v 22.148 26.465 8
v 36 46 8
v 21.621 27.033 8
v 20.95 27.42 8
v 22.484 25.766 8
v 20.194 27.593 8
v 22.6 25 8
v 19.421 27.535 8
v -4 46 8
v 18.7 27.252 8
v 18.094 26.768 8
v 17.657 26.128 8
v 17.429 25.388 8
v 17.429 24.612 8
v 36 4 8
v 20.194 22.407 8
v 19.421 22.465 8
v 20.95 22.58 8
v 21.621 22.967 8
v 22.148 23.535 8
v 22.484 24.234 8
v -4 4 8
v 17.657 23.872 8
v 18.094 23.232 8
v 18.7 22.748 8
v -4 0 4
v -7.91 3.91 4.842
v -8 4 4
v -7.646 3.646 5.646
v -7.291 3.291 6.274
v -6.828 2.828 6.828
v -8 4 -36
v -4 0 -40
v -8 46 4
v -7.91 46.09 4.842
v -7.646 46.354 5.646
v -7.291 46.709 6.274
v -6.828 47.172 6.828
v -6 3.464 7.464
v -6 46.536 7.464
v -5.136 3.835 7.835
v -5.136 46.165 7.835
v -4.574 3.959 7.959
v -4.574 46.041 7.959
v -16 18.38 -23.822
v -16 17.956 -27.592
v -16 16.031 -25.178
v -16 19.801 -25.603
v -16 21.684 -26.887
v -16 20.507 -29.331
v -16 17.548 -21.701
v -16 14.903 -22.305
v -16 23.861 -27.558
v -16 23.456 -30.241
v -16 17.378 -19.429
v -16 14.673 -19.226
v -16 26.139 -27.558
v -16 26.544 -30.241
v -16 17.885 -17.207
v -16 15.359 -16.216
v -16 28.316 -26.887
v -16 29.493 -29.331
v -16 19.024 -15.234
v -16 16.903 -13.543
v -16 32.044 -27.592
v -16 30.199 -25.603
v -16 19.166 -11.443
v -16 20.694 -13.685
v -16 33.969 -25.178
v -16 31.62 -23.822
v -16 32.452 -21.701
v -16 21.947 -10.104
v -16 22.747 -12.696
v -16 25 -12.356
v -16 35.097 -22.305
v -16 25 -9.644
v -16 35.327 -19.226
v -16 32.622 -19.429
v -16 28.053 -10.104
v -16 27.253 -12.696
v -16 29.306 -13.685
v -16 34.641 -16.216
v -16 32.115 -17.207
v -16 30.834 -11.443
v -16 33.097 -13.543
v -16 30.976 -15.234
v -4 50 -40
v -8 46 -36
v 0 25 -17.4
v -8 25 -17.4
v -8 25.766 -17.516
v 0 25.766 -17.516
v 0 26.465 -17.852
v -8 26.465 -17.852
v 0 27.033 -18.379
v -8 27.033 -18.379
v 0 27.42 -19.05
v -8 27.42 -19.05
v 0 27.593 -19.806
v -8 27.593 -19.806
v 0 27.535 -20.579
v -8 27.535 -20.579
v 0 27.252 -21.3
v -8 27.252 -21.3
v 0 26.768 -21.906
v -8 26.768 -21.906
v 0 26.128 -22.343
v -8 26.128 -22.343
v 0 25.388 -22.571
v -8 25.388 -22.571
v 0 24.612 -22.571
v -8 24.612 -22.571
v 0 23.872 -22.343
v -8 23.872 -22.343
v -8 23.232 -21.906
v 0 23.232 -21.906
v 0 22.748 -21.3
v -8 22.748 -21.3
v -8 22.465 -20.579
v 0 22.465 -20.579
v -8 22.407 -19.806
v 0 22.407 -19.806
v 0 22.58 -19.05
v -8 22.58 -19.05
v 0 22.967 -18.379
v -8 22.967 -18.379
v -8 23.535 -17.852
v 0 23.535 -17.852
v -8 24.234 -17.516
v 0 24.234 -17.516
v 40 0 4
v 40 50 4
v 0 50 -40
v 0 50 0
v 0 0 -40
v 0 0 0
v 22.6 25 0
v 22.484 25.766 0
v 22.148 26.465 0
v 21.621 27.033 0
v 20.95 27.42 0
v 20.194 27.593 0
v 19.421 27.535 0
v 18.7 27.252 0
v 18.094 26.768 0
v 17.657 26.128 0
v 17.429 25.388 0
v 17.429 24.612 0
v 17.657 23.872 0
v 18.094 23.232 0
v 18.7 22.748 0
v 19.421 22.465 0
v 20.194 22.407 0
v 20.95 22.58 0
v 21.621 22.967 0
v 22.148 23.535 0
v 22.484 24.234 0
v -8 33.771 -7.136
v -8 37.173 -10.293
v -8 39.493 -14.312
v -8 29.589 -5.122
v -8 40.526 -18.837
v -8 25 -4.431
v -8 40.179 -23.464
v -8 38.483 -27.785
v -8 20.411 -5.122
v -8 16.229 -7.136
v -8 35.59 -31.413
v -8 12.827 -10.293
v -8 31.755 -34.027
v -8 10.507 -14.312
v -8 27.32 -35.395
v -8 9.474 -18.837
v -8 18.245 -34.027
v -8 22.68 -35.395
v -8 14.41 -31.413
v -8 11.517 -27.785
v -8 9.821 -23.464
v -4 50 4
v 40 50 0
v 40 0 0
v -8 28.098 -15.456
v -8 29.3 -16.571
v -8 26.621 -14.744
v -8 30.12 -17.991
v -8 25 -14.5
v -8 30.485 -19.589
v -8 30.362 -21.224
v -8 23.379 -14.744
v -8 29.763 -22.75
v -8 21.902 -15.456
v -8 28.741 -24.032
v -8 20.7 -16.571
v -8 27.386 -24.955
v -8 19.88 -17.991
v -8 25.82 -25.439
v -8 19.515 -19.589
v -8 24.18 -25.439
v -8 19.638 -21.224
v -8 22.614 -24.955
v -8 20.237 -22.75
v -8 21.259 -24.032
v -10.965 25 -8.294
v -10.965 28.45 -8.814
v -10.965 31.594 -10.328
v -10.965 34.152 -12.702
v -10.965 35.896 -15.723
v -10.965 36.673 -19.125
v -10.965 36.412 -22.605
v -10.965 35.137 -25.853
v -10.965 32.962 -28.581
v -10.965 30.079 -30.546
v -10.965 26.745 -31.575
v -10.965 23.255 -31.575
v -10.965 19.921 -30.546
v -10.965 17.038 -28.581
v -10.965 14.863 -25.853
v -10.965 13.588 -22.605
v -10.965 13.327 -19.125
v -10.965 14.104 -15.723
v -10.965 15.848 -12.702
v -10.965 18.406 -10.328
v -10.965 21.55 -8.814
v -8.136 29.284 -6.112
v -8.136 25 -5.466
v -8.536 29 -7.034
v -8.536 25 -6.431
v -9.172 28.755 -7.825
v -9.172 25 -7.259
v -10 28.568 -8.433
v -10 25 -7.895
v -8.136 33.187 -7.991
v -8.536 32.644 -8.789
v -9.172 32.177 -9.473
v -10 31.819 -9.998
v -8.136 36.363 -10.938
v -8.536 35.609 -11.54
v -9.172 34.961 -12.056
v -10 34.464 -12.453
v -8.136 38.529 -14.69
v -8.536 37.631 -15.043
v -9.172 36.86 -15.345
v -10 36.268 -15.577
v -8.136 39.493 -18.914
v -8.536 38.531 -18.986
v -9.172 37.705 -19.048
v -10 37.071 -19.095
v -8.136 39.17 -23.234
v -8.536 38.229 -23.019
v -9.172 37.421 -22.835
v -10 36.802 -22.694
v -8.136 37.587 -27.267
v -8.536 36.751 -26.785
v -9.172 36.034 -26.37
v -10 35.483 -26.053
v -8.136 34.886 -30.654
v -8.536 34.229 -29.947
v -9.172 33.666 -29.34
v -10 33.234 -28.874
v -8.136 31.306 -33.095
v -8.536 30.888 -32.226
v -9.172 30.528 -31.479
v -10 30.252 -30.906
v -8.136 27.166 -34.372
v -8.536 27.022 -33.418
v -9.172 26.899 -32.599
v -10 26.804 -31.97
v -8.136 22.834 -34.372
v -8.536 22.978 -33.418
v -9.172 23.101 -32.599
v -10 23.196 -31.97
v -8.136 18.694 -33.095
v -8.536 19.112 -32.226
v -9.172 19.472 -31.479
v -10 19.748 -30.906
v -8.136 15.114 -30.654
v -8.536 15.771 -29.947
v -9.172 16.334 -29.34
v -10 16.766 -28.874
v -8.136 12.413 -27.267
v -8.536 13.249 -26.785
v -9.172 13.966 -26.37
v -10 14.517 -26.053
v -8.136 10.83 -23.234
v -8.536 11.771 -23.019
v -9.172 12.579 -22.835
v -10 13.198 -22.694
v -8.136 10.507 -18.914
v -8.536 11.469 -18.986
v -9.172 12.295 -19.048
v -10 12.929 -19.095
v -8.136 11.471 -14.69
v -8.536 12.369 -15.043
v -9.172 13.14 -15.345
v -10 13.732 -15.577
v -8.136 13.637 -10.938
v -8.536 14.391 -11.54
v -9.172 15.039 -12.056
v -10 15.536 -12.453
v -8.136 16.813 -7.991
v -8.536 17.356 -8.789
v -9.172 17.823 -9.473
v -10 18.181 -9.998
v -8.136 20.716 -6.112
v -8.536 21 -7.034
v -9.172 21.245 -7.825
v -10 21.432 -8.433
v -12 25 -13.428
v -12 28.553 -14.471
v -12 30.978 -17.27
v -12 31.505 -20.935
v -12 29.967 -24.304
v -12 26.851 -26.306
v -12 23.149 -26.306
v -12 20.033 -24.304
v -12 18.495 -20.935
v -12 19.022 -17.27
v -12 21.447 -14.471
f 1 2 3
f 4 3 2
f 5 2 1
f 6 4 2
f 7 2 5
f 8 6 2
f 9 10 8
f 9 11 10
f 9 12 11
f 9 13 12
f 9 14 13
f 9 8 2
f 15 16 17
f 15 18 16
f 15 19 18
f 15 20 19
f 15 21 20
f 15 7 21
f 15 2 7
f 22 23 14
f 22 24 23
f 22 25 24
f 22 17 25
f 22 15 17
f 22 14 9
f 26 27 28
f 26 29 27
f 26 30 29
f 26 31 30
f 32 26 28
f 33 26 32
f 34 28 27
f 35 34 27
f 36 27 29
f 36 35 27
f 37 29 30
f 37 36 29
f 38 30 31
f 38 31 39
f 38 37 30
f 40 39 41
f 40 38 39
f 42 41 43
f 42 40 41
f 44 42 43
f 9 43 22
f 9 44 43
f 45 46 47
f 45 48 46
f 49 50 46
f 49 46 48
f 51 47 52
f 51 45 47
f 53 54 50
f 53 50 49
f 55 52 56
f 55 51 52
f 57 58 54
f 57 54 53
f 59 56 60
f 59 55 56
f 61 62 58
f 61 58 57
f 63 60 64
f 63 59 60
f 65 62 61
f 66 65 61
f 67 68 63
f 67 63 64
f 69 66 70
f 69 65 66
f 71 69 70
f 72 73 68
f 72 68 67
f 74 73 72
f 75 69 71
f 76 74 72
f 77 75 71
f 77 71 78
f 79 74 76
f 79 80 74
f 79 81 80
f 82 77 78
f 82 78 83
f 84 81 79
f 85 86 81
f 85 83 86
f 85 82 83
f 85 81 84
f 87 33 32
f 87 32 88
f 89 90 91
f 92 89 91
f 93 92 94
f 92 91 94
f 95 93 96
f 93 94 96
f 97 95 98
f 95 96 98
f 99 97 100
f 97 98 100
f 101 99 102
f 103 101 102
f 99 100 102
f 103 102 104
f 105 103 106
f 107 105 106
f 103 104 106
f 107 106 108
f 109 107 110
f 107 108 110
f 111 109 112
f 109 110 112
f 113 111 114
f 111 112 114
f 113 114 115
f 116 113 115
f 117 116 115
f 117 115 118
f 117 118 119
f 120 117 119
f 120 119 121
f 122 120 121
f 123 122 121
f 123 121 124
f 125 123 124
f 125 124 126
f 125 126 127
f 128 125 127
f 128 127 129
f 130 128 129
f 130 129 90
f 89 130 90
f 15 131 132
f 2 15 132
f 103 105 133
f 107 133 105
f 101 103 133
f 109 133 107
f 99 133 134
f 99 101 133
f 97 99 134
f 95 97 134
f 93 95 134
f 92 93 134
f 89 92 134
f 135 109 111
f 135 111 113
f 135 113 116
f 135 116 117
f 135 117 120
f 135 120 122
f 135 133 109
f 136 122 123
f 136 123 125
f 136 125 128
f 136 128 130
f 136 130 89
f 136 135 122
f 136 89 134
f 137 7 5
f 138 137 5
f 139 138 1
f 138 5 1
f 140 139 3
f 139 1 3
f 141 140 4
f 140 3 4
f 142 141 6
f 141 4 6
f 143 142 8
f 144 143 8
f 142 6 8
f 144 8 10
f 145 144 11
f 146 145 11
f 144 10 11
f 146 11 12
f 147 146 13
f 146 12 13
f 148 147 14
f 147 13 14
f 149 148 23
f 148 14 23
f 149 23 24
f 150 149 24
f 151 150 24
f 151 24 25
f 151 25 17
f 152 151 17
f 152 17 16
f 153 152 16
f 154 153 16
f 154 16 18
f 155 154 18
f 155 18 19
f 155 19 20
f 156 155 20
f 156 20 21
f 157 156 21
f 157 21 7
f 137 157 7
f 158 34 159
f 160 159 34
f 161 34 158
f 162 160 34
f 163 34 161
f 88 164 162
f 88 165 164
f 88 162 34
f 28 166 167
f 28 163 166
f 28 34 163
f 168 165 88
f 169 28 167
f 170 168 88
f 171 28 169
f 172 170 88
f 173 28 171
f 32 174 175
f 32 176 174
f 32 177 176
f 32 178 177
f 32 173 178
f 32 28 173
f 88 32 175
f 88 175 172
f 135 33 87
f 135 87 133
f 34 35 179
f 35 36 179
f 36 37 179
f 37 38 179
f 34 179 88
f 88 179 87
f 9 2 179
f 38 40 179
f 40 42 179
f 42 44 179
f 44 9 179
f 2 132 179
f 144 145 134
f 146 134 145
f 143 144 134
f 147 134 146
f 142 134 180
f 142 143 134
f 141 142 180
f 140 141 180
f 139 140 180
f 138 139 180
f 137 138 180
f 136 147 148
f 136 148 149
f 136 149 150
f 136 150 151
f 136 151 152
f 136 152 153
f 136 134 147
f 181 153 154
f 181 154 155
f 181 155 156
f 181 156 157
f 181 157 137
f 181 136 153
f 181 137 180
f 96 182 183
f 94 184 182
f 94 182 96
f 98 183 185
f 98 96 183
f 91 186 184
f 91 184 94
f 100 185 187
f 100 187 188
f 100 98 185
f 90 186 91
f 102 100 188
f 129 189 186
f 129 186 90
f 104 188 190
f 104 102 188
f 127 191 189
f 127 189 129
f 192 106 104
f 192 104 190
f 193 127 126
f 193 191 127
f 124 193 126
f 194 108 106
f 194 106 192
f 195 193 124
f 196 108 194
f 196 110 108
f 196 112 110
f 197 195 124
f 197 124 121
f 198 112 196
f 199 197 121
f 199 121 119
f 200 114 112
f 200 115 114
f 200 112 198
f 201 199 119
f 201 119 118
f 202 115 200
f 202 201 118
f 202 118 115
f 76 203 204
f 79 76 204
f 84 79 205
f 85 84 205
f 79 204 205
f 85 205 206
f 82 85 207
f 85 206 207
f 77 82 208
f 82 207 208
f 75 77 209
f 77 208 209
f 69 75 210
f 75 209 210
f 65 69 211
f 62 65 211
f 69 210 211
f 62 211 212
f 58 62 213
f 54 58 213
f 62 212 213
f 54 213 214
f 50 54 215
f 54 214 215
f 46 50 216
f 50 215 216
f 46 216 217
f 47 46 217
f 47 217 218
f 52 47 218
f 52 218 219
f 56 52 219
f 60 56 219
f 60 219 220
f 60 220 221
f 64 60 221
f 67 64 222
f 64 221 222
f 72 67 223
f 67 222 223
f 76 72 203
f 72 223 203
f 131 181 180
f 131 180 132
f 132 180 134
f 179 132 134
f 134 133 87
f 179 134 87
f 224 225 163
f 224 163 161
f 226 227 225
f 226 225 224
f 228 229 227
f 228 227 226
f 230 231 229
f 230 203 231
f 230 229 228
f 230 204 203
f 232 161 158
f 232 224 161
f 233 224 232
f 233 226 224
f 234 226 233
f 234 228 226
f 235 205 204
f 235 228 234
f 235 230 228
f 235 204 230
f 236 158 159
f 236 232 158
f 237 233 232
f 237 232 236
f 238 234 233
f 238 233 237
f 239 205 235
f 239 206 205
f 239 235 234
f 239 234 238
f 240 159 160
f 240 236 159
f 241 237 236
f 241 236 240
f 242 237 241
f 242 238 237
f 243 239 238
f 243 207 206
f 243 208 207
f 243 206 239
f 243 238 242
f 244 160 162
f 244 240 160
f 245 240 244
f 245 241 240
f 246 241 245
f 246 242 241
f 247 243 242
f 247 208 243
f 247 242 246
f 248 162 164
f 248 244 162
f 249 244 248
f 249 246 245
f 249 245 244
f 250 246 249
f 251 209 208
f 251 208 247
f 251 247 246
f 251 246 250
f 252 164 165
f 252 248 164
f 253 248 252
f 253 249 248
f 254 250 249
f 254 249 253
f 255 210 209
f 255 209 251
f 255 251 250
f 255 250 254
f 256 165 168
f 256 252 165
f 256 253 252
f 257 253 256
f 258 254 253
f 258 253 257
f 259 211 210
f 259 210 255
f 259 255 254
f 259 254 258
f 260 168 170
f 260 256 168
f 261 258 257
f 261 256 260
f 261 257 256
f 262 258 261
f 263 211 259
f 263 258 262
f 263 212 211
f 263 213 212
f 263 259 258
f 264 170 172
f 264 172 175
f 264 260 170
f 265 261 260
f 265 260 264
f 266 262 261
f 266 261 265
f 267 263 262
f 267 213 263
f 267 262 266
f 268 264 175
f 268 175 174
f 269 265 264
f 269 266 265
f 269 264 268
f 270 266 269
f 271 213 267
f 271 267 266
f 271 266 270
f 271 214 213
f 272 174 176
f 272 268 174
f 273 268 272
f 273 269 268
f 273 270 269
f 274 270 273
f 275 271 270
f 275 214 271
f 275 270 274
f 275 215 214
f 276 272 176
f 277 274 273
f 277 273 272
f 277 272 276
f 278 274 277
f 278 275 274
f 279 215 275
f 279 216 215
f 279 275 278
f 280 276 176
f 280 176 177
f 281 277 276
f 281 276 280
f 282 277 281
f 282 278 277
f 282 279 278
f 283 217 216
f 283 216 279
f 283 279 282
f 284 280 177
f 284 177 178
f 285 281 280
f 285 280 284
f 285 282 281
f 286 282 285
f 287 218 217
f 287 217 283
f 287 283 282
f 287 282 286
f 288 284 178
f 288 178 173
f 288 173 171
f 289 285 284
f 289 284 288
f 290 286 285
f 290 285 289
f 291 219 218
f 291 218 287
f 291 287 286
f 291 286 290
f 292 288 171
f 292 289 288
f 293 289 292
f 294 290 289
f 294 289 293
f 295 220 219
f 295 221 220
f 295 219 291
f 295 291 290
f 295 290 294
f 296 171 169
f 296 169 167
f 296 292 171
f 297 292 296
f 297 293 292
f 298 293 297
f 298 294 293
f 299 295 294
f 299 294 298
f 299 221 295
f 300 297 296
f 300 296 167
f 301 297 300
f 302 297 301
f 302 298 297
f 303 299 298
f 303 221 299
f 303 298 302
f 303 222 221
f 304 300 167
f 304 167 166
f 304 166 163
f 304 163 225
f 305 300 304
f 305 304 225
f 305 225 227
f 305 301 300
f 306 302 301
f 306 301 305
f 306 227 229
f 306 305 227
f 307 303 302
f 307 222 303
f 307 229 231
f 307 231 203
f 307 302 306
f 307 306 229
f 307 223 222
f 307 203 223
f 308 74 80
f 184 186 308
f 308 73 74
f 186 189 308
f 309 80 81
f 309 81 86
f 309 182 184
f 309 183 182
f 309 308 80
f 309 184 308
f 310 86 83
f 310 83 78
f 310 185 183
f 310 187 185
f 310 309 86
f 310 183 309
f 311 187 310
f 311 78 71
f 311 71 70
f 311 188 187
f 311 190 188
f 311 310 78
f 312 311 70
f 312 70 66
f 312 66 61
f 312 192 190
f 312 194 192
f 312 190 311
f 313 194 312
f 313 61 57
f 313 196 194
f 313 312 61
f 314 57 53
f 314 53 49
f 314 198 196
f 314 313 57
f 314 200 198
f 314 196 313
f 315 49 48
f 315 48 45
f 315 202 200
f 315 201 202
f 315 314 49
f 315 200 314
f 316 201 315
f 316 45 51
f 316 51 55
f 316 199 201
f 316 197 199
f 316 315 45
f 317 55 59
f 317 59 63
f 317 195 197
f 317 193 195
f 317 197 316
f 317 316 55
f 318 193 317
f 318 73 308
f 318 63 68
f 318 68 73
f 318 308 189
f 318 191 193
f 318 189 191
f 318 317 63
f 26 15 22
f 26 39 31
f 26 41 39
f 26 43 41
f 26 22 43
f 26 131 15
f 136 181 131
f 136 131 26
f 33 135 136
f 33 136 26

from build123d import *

# Parameters (mm, degrees)
BOSS_EXTRUDE1_DEPTH = 50
SKETCH2_R           = 2.6
CUT_EXTRUDE1_DEPTH  = 81.024996095
SKETCH3_R           = 2.6
CUT_EXTRUDE2_DEPTH  = 81.024996095
SKETCH4_R           = 12.5
SKETCH4_R_2         = 5.5
BOSS_EXTRUDE2_DEPTH = 8
BOSS_EXTRUDE2_DRAFT = 15
FILLET1_R           = 4
CHAMFER1_SIZE       = 4
FILLET2_R           = 4


with BuildPart() as part:
    # Sketch1 → Boss-Extrude1 (new body)
    with BuildSketch(Plane(origin=(0, 0, 0), x_dir=(1, 0, 0), z_dir=(0, 1, 0))):
        Polygon((-8, 40), (0, 40), (0, 0), (40, 0), (40, -8), (-8, -8), align=None)
    extrude(amount=BOSS_EXTRUDE1_DEPTH)

    # Sketch2 → Cut-Extrude1 (cut, through all)
    with BuildSketch(Plane.ZY.offset(8)):
        with Locations((-20, 25)):
            Circle(SKETCH2_R)
    extrude(amount=-CUT_EXTRUDE1_DEPTH, mode=Mode.SUBTRACT)

    # Sketch3 → Cut-Extrude2 (cut, through all)
    with BuildSketch(Plane.XY.offset(8)):
        with Locations((20, 25)):
            Circle(SKETCH3_R)
    extrude(amount=-CUT_EXTRUDE2_DEPTH, mode=Mode.SUBTRACT)


with BuildPart() as boss_extrude2_tool:
    # Sketch4 → Boss-Extrude2 (with draft: the straight prism first)
    with BuildSketch(Plane.ZY.offset(8)):
        with Locations((-20, 25)):
            Circle(SKETCH4_R)
        with Locations((-20, 25)):
            Circle(SKETCH4_R_2, mode=Mode.SUBTRACT)
    extrude(amount=BOSS_EXTRUDE2_DEPTH)
    # Boss-Extrude2: the draft: its side faces are tilted about the plane it starts from
    boss_extrude2_sides = [boss_extrude2_tool.faces().sort_by_distance(p)[0] for p in [
        (-12, 25, -32.5),
        (-12, 25, -25.5),
    ]]
    draft(boss_extrude2_sides, Plane.ZY.offset(8), BOSS_EXTRUDE2_DRAFT)


with BuildPart() as part_1:
    add(part.part)

    # Boss-Extrude2: add boss_extrude2_tool
    add(boss_extrude2_tool.part)

    # Fillet1
    fillet1_edges = [part_1.edges().sort_by_distance(p)[0] for p in [
        (-8, 25, -32.5),
    ]]
    fillet(fillet1_edges, radius=FILLET1_R)

    # Chamfer1
    chamfer1_edges = [part_1.edges().sort_by_distance(p)[0] for p in [
        (-8, 25, -40),
        (40, 25, 8),
        (-8, 50, -16),
        (16, 0, 8),
        (-8, 0, -16),
        (16, 50, 8),
    ]]
    chamfer(chamfer1_edges, length=CHAMFER1_SIZE)

    # Fillet2
    fillet2_edges = [part_1.edges().sort_by_distance(p)[0] for p in [
        (-8, 25, 8),
    ]]
    fillet(fillet2_edges, radius=FILLET2_R)


solid = part_1.part
